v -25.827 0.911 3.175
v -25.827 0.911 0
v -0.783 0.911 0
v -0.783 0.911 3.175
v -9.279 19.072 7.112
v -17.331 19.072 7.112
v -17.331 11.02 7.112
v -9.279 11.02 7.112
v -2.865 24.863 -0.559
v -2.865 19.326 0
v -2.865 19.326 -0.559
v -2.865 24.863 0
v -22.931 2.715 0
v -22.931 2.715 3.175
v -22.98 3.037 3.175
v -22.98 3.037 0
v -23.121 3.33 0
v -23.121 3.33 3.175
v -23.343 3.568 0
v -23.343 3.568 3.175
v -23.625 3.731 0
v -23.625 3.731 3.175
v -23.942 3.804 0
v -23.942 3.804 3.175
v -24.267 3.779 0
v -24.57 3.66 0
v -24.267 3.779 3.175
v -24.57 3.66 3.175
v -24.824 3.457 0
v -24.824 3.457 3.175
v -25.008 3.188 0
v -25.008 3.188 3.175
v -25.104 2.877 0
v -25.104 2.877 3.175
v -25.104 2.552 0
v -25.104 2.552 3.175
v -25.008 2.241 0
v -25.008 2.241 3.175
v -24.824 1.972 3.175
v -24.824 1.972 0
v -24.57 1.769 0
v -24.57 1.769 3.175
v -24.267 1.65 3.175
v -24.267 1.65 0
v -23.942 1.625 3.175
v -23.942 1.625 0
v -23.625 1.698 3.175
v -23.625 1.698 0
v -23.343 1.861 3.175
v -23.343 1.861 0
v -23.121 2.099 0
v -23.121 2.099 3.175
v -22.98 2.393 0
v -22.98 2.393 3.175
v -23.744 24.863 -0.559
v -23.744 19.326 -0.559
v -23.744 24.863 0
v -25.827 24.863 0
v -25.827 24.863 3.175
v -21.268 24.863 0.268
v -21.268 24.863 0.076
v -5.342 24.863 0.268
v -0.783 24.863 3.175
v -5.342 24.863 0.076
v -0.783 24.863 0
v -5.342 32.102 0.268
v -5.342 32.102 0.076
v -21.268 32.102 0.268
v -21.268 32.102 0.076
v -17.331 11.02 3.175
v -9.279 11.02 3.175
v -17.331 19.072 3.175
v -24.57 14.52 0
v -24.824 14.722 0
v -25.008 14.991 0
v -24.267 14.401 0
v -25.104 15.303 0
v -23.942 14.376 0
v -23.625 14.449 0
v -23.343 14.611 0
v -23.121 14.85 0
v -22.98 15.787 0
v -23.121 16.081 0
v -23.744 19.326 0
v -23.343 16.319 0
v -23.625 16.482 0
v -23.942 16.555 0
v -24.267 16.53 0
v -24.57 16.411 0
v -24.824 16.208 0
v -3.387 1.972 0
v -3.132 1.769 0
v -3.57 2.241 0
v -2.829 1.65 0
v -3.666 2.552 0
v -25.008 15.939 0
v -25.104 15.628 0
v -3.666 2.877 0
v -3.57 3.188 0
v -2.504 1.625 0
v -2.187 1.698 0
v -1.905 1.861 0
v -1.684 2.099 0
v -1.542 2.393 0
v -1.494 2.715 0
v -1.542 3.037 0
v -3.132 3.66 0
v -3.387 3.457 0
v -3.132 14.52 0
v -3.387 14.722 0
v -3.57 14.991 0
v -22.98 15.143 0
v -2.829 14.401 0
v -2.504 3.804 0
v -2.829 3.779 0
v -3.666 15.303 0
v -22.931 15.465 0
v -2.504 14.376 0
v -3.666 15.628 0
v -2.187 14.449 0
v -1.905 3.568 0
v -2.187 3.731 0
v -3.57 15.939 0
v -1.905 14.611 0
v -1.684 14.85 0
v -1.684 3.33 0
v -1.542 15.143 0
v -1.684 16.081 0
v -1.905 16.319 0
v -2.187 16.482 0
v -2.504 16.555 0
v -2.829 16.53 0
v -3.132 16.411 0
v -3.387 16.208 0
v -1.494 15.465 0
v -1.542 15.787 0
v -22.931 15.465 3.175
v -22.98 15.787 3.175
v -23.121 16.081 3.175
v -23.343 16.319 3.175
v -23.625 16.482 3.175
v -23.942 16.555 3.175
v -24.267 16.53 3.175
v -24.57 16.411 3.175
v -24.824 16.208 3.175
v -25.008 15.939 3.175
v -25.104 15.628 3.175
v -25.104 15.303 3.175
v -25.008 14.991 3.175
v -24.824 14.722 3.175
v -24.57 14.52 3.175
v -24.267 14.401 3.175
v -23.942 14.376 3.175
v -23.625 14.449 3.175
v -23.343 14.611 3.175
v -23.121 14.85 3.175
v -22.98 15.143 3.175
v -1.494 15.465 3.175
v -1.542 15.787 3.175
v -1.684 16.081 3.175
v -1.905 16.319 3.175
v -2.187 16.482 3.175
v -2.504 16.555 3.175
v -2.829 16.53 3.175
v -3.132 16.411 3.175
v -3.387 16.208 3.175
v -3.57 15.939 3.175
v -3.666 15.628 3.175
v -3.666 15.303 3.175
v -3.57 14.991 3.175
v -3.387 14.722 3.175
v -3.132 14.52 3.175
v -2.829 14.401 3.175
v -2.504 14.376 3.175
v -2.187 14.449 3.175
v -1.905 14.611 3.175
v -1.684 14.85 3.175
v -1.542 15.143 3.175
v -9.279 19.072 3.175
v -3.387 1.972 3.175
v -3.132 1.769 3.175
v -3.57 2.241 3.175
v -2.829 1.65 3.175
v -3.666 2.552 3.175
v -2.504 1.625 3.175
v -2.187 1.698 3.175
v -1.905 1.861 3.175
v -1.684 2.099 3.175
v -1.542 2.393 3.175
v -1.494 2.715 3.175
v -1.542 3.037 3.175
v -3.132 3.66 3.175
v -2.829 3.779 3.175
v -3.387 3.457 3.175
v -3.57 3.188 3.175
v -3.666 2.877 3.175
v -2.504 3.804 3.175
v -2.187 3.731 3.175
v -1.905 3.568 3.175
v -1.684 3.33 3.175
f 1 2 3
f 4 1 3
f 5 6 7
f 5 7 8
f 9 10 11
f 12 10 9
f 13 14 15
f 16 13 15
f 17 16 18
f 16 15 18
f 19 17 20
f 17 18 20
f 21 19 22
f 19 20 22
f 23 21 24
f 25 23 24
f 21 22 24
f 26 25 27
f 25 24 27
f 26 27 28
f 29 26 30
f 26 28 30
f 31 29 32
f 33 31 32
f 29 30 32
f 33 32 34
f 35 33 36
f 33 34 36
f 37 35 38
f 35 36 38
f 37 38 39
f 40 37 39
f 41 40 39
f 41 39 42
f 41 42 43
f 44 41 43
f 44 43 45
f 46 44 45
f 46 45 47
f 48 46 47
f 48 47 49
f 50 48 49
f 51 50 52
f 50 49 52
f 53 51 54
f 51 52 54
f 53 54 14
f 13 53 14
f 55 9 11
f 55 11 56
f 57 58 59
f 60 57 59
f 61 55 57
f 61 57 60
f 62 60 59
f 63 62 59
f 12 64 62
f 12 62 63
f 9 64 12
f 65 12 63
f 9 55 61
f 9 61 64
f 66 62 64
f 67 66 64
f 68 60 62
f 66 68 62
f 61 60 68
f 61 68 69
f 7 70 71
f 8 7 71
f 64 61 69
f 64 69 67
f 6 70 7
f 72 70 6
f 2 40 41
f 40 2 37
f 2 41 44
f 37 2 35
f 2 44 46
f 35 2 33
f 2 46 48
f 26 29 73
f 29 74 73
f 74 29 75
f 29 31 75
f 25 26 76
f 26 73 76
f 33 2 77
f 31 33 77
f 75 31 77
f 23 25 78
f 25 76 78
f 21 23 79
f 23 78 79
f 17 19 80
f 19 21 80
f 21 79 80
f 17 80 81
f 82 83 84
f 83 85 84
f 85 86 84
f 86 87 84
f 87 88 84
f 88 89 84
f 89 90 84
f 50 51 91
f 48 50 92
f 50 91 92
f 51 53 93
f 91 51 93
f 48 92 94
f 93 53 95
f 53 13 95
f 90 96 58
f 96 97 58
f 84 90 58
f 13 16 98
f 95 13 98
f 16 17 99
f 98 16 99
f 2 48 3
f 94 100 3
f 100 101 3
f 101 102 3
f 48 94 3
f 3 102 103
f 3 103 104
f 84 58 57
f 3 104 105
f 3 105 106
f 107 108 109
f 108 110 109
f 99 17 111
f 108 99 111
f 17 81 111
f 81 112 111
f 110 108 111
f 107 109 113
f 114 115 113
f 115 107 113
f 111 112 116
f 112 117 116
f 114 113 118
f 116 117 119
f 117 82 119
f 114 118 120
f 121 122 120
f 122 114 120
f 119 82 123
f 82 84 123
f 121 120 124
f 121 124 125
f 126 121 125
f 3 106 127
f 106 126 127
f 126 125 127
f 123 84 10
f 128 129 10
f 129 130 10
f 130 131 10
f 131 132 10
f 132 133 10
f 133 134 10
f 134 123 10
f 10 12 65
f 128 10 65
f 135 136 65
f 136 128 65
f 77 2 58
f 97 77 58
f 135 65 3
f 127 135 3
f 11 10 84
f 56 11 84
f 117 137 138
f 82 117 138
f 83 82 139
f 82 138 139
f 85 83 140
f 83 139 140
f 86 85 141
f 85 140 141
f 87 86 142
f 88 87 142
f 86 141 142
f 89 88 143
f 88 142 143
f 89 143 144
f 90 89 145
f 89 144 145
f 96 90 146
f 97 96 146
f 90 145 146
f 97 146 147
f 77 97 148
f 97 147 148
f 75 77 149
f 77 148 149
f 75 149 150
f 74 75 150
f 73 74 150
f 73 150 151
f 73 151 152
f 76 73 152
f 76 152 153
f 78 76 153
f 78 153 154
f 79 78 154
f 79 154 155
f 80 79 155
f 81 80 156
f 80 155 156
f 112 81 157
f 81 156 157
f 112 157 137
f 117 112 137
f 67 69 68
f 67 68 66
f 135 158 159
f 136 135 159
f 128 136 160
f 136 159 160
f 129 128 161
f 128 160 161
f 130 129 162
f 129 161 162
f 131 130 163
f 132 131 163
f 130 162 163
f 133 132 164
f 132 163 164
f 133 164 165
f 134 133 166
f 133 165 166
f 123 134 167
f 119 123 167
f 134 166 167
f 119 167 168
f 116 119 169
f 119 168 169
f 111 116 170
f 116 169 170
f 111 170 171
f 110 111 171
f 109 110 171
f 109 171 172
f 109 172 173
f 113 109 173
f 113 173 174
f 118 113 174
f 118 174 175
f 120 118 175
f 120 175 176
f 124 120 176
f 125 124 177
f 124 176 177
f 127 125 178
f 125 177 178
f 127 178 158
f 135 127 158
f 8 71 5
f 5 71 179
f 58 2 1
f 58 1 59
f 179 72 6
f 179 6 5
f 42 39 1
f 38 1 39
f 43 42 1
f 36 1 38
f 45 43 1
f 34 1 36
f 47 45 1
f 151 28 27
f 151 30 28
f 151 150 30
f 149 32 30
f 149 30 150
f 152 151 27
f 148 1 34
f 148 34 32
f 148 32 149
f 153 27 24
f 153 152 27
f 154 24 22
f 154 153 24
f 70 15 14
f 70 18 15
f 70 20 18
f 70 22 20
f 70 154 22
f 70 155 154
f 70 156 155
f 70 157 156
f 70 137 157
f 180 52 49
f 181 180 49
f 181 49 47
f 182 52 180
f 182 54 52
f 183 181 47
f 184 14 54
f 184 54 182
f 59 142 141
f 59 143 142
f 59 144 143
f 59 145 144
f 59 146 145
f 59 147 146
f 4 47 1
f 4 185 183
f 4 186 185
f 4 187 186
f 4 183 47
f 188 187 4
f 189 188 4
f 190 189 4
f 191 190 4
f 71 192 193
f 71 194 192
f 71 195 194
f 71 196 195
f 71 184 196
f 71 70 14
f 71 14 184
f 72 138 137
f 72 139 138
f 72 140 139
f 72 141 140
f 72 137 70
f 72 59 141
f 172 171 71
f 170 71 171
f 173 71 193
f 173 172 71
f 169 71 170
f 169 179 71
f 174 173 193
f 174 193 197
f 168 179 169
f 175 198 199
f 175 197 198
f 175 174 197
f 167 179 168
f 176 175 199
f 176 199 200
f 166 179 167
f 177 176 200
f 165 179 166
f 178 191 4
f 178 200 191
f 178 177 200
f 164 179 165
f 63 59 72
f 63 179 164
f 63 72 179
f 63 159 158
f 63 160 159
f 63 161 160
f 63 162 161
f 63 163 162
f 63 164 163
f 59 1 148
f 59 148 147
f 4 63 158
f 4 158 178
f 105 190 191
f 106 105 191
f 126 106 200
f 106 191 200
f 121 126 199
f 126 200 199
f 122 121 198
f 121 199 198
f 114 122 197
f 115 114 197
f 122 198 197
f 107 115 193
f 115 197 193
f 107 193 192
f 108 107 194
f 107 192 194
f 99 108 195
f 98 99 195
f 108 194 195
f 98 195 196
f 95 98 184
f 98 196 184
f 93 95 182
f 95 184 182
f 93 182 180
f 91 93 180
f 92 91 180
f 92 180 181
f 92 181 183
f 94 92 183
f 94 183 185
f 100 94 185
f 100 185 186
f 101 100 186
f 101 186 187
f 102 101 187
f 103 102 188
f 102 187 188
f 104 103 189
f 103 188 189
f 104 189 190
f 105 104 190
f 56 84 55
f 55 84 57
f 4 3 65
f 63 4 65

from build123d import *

# Parameters (mm, degrees)
SKETCH1_W           = 25.0444
SKETCH1_H           = 23.9522
BOSS_EXTRUDE1_DEPTH = 3.175
SKETCH2_R           = 1.0922
CUT_EXTRUDE1_DEPTH  = 3.175
SKETCH3_W           = 8.0518
SKETCH3_H           = 8.0518
BOSS_EXTRUDE2_DEPTH = 3.937
SKETCH4_W           = 20.8788
SKETCH4_H           = 5.5372
BOSS_EXTRUDE3_DEPTH = 0.5588
SKETCH5_W           = 15.9258
SKETCH5_H           = 0.191961024
BOSS_EXTRUDE4_DEPTH = 7.239


with BuildPart() as part:
    # Sketch1 → Boss-Extrude1 (new body)
    with BuildSketch(Plane.XY):
        with Locations((-13.304877678, 12.887280749)):
            Rectangle(SKETCH1_W, SKETCH1_H)
    extrude(amount=BOSS_EXTRUDE1_DEPTH)

    # Sketch2 → Cut-Extrude1 (cut)
    with BuildSketch(Plane.XY.offset(3.175)):
        with Locations((-2.586077678, 2.714580749)):
            Circle(SKETCH2_R)
        with Locations((-2.586077678, 15.465380749)):
            Circle(SKETCH2_R)
        with Locations((-24.023677678, 2.714580749)):
            Circle(SKETCH2_R)
        with Locations((-24.023677678, 15.465380749)):
            Circle(SKETCH2_R)
    extrude(amount=-CUT_EXTRUDE1_DEPTH, mode=Mode.SUBTRACT)

    # Sketch3 → Boss-Extrude2 (add)
    with BuildSketch(Plane.XY.offset(3.175)):
        with Locations((-13.304877678, 15.046280749)):
            Rectangle(SKETCH3_W, SKETCH3_H)
    extrude(amount=BOSS_EXTRUDE2_DEPTH)

    # Sketch4 → Boss-Extrude3 (add)
    with BuildSketch(Plane(origin=(0, 0, 0), x_dir=(-1, 0, 0), z_dir=(0, 0, -1))):
        with Locations((13.304877678, 22.094780749)):
            Rectangle(SKETCH4_W, SKETCH4_H)
    extrude(amount=BOSS_EXTRUDE3_DEPTH)

    # Sketch5 → Boss-Extrude4 (add)
    with BuildSketch(Plane(origin=(0, 24.863380749, 0), x_dir=(1, 0, 0), z_dir=(0, 1, 0))):
        with Locations((-13.304877678, -0.172180512)):
            Rectangle(SKETCH5_W, SKETCH5_H)
    extrude(amount=BOSS_EXTRUDE4_DEPTH)


solid = part.part
